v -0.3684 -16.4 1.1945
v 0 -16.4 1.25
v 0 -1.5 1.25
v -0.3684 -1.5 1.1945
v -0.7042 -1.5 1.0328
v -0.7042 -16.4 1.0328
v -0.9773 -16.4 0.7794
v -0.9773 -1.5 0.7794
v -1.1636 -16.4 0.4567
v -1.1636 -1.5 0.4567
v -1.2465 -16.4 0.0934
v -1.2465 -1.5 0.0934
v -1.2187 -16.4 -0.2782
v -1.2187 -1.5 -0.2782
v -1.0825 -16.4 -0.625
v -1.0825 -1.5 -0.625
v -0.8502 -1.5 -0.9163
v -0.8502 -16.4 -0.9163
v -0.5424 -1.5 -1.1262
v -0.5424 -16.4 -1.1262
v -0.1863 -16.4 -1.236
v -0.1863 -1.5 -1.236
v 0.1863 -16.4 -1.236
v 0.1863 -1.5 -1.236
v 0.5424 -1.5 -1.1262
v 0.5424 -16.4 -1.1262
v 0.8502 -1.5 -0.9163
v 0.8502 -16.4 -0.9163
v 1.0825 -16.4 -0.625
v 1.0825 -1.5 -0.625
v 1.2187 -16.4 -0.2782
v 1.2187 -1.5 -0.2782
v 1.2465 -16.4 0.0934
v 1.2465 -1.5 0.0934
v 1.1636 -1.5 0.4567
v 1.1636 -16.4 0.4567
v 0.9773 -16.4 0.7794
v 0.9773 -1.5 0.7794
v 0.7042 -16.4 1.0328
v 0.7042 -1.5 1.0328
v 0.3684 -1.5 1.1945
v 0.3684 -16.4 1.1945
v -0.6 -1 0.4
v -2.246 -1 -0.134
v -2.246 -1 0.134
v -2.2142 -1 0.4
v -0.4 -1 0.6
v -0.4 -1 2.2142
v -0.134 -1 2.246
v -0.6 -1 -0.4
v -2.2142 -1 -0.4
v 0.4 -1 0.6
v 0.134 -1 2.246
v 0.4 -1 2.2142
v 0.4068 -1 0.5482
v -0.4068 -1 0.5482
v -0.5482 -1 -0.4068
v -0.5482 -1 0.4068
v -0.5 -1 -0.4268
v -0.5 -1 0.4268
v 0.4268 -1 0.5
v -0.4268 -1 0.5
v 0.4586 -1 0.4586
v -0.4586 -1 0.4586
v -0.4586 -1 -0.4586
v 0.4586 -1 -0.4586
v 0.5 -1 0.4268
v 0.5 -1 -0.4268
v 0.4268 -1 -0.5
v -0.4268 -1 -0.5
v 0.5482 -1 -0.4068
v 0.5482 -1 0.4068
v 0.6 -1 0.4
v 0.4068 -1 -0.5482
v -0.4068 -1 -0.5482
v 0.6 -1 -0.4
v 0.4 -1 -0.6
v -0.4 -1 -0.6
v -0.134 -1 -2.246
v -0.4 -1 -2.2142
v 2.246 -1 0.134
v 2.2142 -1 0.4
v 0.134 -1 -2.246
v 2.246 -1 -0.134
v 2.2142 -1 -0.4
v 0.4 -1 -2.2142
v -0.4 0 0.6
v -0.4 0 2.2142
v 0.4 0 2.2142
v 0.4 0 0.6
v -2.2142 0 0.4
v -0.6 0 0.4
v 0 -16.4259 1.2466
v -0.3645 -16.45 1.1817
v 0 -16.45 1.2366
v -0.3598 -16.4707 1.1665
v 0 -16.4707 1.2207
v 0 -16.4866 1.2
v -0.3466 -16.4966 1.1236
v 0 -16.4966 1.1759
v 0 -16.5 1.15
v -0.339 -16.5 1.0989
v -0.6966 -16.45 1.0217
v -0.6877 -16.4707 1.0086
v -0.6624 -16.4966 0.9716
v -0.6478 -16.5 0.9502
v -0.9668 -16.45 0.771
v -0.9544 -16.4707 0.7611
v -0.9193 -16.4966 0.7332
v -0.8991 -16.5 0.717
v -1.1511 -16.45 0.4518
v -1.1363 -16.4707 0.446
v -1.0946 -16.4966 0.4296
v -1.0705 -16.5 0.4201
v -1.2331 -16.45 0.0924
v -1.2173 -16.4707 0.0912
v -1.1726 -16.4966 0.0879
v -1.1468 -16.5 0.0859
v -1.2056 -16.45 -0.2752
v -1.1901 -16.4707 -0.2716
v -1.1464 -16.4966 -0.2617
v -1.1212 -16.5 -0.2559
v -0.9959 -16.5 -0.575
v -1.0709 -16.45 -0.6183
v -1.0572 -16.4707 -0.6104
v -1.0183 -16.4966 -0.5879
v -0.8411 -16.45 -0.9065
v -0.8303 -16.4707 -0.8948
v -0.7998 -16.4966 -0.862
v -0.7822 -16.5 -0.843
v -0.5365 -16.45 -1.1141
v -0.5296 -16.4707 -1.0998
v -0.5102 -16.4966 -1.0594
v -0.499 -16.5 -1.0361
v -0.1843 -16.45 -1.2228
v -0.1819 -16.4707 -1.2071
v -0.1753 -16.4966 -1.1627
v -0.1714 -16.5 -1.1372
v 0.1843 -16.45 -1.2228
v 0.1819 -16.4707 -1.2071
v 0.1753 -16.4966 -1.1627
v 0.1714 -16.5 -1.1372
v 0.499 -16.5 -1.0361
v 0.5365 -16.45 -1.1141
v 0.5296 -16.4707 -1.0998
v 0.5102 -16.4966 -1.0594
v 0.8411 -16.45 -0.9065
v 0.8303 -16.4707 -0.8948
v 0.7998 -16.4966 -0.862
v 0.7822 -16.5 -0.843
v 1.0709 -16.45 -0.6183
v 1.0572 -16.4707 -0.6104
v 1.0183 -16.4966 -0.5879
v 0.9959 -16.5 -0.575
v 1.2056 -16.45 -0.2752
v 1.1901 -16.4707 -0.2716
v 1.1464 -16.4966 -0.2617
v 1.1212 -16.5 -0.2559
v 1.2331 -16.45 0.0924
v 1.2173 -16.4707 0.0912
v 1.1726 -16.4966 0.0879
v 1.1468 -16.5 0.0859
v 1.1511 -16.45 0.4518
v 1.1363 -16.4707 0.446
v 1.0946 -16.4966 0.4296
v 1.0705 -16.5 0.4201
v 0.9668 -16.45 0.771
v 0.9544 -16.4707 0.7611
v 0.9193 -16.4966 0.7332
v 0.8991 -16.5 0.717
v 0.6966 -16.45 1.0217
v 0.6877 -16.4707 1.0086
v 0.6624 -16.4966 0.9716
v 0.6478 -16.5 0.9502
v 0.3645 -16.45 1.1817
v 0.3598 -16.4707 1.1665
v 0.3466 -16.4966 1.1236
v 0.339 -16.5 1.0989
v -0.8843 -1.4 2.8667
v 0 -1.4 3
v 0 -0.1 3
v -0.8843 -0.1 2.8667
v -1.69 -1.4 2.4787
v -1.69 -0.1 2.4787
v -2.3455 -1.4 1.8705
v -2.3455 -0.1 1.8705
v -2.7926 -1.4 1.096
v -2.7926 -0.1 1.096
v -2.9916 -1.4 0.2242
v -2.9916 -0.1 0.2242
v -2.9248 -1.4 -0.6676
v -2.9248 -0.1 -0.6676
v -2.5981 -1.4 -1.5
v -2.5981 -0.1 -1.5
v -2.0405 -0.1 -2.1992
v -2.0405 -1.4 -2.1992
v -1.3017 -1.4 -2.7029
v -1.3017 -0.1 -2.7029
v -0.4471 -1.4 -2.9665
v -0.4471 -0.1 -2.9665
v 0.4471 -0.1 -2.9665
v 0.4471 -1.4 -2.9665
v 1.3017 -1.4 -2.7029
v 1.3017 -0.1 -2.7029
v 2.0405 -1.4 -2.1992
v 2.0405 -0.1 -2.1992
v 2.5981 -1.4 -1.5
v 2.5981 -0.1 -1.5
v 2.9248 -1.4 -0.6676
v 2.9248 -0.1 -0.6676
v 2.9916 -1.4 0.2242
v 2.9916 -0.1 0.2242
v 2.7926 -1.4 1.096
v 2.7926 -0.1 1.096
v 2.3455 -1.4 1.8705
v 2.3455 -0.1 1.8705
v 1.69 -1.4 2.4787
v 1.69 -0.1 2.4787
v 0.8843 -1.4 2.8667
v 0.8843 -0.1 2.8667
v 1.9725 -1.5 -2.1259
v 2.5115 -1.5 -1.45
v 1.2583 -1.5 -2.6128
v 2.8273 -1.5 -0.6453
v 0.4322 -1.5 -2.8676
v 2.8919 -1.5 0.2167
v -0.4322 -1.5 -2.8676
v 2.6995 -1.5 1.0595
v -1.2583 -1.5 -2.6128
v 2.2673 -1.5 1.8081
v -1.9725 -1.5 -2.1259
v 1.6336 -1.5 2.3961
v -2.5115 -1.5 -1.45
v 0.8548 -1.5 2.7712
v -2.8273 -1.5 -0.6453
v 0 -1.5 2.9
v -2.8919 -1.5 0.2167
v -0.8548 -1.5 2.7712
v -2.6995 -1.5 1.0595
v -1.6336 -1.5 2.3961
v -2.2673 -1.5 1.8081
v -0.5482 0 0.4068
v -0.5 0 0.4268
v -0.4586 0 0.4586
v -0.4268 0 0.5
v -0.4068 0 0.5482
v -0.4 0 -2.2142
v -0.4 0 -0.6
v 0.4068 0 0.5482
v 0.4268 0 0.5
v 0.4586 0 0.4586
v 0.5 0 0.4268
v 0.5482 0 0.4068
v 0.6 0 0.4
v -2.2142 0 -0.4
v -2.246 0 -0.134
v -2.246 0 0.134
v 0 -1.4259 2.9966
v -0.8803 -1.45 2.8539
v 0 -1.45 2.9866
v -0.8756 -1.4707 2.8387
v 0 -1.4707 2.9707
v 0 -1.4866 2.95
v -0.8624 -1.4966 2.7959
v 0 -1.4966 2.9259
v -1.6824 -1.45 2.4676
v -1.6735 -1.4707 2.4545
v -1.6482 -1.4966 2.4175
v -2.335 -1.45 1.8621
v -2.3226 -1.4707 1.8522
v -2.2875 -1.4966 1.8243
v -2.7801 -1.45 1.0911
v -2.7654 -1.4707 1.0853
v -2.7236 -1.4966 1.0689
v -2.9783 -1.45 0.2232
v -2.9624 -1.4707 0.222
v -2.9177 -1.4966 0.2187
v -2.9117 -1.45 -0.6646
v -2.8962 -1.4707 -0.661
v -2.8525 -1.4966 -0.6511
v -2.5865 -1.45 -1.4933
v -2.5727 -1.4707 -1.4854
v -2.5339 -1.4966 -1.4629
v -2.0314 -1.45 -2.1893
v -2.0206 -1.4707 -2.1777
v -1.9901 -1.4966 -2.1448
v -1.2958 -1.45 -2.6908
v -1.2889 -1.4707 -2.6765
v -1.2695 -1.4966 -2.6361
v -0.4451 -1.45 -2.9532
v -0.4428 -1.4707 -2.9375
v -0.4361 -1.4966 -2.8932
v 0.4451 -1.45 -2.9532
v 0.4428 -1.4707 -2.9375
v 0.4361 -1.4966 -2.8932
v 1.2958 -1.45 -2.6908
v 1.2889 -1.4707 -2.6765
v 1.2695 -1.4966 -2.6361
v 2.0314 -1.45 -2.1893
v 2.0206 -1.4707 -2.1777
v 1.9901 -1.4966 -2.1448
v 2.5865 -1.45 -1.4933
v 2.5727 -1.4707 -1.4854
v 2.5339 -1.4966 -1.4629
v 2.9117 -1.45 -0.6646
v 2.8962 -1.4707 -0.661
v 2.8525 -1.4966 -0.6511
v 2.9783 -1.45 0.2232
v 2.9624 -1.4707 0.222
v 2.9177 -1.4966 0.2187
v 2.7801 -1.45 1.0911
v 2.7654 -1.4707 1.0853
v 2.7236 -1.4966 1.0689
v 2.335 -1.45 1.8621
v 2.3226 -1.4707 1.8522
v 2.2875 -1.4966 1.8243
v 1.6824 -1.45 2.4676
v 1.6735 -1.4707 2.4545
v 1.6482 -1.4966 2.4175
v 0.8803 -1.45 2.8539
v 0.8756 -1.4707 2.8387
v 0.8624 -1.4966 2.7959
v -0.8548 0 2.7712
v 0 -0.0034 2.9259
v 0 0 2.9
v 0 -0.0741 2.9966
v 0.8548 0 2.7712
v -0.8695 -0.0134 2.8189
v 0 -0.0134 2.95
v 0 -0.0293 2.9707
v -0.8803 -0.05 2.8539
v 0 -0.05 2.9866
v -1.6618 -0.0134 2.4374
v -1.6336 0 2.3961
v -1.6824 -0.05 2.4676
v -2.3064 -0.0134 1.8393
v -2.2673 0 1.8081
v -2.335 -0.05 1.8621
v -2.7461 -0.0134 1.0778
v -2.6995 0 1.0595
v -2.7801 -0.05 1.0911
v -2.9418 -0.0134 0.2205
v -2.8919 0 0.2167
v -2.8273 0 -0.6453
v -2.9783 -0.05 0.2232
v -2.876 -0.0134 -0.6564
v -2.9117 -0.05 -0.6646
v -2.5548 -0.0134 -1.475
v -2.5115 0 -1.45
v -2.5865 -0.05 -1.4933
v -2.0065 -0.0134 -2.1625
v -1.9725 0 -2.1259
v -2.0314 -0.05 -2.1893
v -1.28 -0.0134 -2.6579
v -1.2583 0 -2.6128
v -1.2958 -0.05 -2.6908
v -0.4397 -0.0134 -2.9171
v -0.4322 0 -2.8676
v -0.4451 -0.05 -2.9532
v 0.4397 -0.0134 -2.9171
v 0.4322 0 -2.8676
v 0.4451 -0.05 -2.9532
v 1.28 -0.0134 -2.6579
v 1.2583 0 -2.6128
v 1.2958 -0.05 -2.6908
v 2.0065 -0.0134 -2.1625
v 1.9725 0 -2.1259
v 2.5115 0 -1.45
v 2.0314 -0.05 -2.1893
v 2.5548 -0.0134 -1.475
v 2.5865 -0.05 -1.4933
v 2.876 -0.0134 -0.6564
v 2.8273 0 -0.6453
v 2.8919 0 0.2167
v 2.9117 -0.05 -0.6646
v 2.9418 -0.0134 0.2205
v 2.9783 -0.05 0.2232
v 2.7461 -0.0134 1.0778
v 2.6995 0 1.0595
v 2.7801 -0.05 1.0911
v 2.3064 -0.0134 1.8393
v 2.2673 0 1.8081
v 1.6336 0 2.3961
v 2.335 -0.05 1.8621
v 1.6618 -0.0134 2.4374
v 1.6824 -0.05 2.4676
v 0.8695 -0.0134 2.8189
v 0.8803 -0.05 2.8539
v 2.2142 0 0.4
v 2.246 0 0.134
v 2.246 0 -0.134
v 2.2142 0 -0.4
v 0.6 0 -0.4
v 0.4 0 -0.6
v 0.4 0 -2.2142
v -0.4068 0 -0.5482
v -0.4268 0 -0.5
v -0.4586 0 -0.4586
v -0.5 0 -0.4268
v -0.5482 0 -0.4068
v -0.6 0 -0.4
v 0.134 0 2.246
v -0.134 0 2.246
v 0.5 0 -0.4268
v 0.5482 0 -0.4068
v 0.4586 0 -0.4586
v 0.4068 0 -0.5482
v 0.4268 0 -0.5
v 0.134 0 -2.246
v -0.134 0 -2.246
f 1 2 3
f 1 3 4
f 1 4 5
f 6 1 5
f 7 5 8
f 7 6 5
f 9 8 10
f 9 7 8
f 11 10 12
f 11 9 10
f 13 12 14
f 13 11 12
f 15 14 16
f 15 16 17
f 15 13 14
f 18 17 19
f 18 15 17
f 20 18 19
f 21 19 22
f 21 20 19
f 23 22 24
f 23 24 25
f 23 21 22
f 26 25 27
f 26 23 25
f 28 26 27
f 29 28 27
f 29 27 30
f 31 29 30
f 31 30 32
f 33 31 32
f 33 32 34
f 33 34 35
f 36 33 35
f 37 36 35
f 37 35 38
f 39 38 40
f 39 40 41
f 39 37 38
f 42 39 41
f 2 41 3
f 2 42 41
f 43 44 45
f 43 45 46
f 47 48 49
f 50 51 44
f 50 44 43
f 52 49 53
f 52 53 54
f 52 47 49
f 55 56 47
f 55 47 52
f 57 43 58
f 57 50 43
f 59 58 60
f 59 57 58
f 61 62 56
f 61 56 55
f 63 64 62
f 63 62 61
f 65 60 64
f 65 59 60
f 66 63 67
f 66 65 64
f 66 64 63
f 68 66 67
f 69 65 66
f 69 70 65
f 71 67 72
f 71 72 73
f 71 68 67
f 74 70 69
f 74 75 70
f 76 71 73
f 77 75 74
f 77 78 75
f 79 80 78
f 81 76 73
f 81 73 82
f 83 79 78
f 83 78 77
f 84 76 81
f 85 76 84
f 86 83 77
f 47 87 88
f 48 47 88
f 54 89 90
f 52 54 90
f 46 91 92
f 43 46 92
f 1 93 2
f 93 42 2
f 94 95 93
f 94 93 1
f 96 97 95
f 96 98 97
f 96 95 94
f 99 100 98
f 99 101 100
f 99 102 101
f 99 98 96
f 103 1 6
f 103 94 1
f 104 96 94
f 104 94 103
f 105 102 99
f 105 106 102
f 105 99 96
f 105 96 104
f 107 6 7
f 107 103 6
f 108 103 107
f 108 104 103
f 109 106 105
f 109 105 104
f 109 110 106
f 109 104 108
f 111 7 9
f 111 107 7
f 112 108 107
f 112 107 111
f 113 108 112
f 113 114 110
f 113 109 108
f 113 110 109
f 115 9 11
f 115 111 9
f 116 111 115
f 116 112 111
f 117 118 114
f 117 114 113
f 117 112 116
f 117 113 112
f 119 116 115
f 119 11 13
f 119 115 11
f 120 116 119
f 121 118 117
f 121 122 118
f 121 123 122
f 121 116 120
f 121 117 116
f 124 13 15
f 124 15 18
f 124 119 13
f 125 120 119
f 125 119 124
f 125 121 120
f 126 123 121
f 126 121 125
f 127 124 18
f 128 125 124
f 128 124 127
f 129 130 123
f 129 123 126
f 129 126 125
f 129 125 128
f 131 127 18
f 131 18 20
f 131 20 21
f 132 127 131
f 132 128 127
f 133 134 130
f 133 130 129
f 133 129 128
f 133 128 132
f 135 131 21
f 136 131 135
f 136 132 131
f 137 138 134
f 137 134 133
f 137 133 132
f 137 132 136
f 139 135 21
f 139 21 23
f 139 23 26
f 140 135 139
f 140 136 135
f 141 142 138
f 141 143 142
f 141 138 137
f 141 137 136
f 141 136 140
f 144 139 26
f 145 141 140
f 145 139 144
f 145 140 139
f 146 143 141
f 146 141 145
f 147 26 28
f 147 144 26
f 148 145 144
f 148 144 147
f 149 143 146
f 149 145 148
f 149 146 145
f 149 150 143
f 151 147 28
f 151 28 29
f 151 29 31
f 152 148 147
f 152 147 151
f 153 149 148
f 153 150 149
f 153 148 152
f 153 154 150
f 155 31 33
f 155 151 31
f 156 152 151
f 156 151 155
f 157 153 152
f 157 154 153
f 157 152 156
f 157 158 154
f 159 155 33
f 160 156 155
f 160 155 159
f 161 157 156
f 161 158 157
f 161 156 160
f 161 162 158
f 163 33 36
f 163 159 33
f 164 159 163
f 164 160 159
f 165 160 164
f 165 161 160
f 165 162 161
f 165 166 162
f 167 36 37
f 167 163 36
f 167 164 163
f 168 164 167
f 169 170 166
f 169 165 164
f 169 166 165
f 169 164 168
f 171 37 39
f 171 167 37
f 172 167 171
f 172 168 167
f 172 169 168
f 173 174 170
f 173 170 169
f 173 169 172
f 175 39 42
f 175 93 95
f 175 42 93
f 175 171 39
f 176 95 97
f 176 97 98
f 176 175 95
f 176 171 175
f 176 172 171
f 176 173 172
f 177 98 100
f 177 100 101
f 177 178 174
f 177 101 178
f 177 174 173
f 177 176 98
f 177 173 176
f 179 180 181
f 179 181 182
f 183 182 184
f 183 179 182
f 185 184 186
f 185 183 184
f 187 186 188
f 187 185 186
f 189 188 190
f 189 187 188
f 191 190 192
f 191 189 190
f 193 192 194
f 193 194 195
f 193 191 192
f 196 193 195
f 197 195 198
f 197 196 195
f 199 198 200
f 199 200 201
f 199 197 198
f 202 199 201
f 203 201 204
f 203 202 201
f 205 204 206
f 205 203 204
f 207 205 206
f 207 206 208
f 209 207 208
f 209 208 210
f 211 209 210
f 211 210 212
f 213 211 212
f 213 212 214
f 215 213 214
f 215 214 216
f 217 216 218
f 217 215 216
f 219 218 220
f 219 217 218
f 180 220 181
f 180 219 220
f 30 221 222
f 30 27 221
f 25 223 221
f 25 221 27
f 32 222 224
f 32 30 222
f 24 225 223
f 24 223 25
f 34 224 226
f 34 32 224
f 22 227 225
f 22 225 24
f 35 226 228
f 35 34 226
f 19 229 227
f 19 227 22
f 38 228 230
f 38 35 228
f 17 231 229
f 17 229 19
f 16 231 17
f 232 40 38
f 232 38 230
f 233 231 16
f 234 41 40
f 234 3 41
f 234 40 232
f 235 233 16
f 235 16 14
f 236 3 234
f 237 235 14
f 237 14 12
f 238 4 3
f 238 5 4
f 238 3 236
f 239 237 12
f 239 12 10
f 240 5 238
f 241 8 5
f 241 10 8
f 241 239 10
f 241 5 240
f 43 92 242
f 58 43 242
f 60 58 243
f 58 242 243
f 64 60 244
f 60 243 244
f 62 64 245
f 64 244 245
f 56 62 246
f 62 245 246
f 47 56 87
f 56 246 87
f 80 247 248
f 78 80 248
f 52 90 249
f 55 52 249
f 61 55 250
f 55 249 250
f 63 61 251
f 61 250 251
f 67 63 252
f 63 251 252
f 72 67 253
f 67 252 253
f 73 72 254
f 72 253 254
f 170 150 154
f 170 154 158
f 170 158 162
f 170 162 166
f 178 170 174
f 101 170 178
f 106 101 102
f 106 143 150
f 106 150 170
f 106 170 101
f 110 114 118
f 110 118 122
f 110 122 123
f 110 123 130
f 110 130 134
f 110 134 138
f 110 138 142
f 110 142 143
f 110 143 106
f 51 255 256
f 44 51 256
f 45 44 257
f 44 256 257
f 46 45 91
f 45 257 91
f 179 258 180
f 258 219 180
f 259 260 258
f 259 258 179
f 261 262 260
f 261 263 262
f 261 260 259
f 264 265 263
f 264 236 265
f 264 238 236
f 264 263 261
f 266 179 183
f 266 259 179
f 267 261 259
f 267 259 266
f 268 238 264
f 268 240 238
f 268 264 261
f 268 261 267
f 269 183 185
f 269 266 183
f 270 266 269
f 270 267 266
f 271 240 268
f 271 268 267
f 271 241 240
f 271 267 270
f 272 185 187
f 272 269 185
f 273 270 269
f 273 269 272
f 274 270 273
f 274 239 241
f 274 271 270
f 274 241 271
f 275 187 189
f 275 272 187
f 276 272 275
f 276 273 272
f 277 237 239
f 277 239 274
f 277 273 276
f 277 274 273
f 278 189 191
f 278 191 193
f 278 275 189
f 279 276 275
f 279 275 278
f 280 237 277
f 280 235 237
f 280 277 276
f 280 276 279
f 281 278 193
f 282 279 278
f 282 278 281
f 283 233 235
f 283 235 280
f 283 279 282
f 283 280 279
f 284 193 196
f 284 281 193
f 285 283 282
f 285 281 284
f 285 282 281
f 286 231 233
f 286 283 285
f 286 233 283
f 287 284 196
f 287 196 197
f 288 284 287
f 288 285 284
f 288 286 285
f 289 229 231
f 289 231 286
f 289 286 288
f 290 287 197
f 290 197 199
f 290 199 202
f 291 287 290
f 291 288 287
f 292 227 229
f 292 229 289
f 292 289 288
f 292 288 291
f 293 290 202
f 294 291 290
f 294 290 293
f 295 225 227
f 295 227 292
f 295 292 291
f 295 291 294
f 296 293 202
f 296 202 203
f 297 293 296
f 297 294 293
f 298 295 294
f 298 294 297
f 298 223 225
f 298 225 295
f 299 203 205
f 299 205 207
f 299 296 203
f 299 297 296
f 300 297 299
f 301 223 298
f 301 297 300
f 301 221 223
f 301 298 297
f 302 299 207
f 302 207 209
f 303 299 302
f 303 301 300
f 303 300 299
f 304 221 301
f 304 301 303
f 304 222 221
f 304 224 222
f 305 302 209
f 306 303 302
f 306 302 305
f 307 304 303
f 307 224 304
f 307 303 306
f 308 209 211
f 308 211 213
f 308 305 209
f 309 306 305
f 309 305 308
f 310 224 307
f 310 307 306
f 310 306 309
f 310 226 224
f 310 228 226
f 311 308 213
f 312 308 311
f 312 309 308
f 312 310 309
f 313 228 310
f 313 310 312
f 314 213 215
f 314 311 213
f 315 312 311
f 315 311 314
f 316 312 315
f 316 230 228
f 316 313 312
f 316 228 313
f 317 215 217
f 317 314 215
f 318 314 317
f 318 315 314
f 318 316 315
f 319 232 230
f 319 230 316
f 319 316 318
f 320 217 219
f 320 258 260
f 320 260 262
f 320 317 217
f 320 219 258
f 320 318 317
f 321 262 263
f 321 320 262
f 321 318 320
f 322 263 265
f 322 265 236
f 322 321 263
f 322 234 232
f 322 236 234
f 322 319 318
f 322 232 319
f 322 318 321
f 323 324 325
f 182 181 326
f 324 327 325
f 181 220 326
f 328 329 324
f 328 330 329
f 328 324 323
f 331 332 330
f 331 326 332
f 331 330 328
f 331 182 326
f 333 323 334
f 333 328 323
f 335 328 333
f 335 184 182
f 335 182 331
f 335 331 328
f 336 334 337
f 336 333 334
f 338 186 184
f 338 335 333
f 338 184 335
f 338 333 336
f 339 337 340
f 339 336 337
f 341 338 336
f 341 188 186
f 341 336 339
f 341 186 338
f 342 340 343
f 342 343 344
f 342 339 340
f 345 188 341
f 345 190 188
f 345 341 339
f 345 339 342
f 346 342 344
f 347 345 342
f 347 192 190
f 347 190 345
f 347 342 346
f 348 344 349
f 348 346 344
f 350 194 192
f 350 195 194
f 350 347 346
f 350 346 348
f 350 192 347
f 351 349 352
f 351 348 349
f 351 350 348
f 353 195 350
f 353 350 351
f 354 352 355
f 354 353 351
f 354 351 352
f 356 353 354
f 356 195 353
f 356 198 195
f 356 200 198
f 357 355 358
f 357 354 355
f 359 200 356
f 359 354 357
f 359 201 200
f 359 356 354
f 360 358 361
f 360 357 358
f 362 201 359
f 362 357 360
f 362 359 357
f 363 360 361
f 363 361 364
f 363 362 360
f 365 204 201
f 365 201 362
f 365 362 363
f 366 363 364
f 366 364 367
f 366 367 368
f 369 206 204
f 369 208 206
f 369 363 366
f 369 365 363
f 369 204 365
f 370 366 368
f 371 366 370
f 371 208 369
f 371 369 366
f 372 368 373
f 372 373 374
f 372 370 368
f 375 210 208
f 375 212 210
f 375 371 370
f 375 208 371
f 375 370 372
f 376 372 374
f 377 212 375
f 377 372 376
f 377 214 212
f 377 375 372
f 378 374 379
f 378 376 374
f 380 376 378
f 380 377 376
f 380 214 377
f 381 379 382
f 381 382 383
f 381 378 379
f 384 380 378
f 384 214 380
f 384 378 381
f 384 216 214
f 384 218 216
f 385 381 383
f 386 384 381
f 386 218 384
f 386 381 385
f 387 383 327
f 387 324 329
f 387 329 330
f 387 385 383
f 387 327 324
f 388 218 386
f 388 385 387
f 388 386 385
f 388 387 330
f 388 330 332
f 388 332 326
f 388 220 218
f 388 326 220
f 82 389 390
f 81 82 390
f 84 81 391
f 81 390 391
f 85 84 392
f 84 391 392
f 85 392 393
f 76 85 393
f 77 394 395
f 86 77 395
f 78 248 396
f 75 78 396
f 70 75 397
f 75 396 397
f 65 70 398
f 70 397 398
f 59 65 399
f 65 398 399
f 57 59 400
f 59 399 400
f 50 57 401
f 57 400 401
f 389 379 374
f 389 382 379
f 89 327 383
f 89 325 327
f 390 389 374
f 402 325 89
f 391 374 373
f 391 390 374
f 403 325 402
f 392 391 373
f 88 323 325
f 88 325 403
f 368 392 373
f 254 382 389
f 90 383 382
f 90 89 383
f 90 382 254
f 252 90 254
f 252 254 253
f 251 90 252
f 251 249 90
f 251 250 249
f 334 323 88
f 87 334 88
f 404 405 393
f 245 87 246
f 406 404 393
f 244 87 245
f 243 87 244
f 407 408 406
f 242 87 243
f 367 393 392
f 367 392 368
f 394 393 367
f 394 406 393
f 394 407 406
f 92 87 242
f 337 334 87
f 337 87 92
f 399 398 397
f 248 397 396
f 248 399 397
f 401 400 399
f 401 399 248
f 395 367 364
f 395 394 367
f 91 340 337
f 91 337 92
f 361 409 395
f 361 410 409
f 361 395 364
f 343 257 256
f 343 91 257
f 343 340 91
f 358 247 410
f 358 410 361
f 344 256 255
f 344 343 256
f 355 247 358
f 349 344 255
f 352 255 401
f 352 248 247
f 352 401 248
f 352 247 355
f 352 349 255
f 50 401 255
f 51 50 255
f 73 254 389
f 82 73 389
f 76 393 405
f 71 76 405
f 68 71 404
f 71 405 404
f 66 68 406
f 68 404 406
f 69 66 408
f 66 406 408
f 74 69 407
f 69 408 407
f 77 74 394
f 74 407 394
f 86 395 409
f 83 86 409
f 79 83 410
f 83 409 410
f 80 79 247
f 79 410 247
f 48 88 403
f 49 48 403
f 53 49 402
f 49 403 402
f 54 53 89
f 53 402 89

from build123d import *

# Parameters (mm, degrees)
FILLET1_R          = 0.1
CUT_EXTRUDE1_DEPTH = 1


with BuildPart() as part:
    # Sketch1 → Revolve1 (revolve)
    with BuildSketch(Plane.XY, mode=Mode.PRIVATE) as revolve1_sk:
        Polygon((0, 0), (-3, 0), (-3, -1.5), (-1.25, -1.5), (-1.25, -16.5), (0, -16.5), align=None)
    revolve(revolve1_sk.sketch.rotate(Axis((0, 14.912855268, 0), (0, -1, 0)), 270), axis=Axis((0, 14.912855268, 0), (0, -1, 0)))

    # Fillet1
    fillet1_edges = [part.edges().sort_by_distance(p)[0] for p in [
        (0, -16.5, -1.25),
        (0, -1.5, -3),
        (0, 0, -3),
    ]]
    fillet(fillet1_edges, radius=FILLET1_R)

    # Sketch2 → Cut-Extrude1 (cut)
    with BuildSketch(Plane(origin=(0, 0, 0), x_dir=(1, 0, 0), z_dir=(0, 1, 0))):
        with BuildLine():
            Line((-2.214158983, -0.4), (-0.6, -0.4))
            ThreePointArc((-0.6, -0.4), (-0.458578644, -0.458578644), (-0.4, -0.6))
            Line((-0.4, -0.6), (-0.4, -2.214158983))
            ThreePointArc((-0.4, -2.214158983), (0, -2.25), (0.4, -2.214158983))
            Line((0.4, -2.214158983), (0.4, -0.6))
            ThreePointArc((0.4, -0.6), (0.458578644, -0.458578644), (0.6, -0.4))
            Line((0.6, -0.4), (2.214158983, -0.4))
            ThreePointArc((2.214158983, -0.4), (2.25, 0), (2.214158983, 0.4))
            Line((2.214158983, 0.4), (0.6, 0.4))
            ThreePointArc((0.6, 0.4), (0.458578644, 0.458578644), (0.4, 0.6))
            Line((0.4, 0.6), (0.4, 2.214158983))
            ThreePointArc((0.4, 2.214158983), (0, 2.25), (-0.4, 2.214158983))
            Line((-0.4, 2.214158983), (-0.4, 0.6))
            ThreePointArc((-0.4, 0.6), (-0.458578644, 0.458578644), (-0.6, 0.4))
            Line((-0.6, 0.4), (-2.214158983, 0.4))
            ThreePointArc((-2.214158983, 0.4), (-2.25, 0), (-2.214158983, -0.4))
        make_face()
    extrude(amount=-CUT_EXTRUDE1_DEPTH, mode=Mode.SUBTRACT)


solid = part.part
